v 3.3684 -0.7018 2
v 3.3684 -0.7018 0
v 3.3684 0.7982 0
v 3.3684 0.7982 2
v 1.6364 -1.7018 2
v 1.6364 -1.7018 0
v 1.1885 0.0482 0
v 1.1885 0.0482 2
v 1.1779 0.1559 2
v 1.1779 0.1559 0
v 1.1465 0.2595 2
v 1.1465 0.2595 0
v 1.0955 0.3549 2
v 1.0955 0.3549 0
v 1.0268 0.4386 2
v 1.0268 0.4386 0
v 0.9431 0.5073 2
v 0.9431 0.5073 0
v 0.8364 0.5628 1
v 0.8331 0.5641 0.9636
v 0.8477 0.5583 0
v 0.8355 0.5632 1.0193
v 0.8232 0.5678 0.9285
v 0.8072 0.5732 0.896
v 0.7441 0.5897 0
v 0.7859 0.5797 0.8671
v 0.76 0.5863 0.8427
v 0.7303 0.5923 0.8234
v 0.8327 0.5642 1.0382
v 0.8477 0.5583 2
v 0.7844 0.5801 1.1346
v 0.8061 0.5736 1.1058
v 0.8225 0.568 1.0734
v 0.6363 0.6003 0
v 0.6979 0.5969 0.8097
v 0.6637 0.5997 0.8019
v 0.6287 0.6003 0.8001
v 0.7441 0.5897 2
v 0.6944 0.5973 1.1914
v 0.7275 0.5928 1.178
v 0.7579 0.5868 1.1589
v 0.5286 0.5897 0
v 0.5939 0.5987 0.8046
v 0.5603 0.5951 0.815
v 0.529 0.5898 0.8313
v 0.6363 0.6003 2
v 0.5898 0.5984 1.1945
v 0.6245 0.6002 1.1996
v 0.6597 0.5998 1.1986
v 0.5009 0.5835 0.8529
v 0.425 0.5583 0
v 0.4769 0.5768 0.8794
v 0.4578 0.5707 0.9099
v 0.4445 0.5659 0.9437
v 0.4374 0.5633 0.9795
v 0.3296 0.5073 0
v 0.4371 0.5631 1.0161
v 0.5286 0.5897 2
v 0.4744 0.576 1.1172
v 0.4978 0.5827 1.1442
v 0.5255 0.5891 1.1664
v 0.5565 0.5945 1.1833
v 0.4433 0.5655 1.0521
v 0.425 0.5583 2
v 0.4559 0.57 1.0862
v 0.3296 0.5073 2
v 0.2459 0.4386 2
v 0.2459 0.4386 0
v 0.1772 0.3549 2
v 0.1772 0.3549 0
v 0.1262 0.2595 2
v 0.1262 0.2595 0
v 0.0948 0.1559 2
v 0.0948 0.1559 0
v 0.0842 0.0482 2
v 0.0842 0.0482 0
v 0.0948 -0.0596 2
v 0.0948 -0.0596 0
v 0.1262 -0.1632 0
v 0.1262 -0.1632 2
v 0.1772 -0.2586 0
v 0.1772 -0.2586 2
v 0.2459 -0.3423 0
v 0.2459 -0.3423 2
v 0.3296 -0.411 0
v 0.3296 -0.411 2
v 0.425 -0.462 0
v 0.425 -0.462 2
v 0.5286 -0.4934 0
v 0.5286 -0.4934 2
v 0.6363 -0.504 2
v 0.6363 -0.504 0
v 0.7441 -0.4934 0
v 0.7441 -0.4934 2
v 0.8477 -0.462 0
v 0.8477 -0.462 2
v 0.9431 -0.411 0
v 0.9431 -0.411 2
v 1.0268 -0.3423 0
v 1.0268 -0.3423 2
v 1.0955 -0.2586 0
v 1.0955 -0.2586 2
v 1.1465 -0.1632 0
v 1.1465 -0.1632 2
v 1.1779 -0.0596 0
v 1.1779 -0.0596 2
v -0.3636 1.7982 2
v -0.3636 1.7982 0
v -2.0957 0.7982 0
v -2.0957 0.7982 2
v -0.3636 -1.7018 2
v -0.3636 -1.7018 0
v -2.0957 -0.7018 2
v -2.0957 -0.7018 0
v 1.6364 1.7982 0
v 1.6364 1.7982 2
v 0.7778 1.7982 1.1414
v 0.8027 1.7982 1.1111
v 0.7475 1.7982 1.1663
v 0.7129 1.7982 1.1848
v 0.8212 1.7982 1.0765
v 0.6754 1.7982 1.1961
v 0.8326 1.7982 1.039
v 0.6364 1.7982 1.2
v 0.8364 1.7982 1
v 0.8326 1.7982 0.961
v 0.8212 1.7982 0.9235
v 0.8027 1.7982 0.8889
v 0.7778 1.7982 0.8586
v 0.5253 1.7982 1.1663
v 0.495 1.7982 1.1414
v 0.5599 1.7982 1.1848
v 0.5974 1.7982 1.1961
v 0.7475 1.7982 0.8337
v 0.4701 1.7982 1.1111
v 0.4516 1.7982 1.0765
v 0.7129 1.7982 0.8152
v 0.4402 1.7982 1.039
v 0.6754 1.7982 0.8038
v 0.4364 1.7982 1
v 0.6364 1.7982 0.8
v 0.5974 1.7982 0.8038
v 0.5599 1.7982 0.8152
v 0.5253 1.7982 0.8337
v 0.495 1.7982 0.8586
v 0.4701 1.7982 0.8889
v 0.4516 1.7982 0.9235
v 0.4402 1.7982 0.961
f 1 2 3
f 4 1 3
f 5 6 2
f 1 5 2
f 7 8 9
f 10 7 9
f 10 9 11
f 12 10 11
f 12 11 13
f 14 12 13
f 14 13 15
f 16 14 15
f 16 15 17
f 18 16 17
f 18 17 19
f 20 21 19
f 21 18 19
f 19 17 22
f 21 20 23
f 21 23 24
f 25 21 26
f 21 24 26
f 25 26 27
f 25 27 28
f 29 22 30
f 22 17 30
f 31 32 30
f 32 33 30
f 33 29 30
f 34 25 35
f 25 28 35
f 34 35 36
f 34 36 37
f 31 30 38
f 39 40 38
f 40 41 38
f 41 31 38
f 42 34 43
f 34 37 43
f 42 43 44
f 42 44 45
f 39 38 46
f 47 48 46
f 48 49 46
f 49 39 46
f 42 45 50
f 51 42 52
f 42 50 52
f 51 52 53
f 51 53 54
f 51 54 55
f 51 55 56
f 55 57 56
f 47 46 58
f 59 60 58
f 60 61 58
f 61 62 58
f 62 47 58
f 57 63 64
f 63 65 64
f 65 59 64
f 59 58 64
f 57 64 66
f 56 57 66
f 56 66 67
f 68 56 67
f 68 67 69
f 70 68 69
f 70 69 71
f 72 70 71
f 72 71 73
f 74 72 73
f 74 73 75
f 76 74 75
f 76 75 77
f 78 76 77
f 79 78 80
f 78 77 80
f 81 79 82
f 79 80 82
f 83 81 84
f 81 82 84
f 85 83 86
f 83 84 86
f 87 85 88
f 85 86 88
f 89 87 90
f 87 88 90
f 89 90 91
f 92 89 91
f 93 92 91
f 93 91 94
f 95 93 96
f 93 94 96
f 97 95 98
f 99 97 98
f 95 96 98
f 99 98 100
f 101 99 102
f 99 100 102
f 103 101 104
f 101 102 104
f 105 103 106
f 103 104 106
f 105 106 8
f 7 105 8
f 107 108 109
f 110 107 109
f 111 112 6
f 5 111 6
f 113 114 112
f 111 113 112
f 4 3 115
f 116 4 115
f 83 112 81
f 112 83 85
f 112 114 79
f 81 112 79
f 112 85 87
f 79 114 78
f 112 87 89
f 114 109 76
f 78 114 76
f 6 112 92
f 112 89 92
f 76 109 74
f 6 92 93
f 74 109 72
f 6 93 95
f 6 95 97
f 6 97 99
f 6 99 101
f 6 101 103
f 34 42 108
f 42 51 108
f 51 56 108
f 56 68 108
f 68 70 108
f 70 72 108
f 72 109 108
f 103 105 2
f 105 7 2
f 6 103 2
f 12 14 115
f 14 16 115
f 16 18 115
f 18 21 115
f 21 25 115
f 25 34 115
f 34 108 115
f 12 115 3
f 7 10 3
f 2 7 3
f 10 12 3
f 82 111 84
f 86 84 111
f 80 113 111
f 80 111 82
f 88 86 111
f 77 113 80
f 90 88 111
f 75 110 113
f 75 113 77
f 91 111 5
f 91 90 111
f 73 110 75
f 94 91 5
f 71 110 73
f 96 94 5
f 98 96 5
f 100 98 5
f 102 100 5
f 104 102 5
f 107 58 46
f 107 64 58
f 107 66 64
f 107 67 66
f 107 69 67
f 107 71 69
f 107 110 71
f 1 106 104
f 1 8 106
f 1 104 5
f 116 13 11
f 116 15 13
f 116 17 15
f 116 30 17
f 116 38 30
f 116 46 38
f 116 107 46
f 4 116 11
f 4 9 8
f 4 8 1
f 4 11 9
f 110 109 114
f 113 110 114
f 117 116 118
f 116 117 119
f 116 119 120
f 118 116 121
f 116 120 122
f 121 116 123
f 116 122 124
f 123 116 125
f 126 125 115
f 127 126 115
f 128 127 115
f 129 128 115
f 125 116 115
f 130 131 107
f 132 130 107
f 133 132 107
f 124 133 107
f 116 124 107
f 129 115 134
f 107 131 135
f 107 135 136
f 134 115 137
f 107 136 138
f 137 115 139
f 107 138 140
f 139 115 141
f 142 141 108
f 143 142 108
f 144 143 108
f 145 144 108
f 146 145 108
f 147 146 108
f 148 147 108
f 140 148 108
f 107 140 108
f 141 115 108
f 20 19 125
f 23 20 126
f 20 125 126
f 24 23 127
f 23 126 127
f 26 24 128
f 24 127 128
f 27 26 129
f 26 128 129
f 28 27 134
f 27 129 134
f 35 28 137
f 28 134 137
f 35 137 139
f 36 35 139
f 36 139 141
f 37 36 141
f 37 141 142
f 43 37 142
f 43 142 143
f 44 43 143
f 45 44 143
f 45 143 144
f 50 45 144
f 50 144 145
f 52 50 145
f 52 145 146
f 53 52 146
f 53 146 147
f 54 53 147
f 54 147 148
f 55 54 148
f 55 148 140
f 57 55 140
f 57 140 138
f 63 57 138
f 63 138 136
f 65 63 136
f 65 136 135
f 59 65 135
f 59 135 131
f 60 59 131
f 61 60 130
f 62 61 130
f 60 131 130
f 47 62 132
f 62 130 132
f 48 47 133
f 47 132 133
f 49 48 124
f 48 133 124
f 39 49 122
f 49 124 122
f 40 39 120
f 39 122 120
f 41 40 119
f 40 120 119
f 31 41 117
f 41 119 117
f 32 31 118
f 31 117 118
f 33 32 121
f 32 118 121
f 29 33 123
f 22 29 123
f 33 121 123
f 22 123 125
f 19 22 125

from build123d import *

# Parameters (mm, degrees)
BOSS_EXTRU_1_DEPTH      = 2
ESQUISSE2_R             = 0.552184806
ENL_V_MAT_EXTRU_1_DEPTH = 2
ESQUISSE3_R             = 0.2
ENL_V_MAT_EXTRU_2_DEPTH = 2


with BuildPart() as part:
    # Esquisse1 → Boss.-Extru.1 (new body)
    with BuildSketch(Plane.XY):
        Polygon((-0.363611689, 1.798165138), (-2.095662496, 0.798165138), (-2.095662496, -0.701834862), (-0.363611689, -1.701834862), (1.636388311, -1.701834862), (3.368439119, -0.701834862), (3.368439119, 0.798165138), (1.636388311, 1.798165138), align=None)
    extrude(amount=BOSS_EXTRU_1_DEPTH)

    # Esquisse2 → Enlèv. mat.-Extru.1 (cut)
    with BuildSketch(Plane.XY.offset(2)):
        with Locations((0.636338311, 0.048155138)):
            Circle(ESQUISSE2_R)
    extrude(amount=-ENL_V_MAT_EXTRU_1_DEPTH, mode=Mode.SUBTRACT)

    # Esquisse3 → Enlèv. mat.-Extru.2 (cut)
    with BuildSketch(Plane(origin=(0, 1.798165138, 0), x_dir=(1, 0, 0), z_dir=(0, 1, 0))):
        with Locations((0.636398311, -0.99999)):
            Circle(ESQUISSE3_R)
    extrude(amount=-ENL_V_MAT_EXTRU_2_DEPTH, mode=Mode.SUBTRACT)


solid = part.part
